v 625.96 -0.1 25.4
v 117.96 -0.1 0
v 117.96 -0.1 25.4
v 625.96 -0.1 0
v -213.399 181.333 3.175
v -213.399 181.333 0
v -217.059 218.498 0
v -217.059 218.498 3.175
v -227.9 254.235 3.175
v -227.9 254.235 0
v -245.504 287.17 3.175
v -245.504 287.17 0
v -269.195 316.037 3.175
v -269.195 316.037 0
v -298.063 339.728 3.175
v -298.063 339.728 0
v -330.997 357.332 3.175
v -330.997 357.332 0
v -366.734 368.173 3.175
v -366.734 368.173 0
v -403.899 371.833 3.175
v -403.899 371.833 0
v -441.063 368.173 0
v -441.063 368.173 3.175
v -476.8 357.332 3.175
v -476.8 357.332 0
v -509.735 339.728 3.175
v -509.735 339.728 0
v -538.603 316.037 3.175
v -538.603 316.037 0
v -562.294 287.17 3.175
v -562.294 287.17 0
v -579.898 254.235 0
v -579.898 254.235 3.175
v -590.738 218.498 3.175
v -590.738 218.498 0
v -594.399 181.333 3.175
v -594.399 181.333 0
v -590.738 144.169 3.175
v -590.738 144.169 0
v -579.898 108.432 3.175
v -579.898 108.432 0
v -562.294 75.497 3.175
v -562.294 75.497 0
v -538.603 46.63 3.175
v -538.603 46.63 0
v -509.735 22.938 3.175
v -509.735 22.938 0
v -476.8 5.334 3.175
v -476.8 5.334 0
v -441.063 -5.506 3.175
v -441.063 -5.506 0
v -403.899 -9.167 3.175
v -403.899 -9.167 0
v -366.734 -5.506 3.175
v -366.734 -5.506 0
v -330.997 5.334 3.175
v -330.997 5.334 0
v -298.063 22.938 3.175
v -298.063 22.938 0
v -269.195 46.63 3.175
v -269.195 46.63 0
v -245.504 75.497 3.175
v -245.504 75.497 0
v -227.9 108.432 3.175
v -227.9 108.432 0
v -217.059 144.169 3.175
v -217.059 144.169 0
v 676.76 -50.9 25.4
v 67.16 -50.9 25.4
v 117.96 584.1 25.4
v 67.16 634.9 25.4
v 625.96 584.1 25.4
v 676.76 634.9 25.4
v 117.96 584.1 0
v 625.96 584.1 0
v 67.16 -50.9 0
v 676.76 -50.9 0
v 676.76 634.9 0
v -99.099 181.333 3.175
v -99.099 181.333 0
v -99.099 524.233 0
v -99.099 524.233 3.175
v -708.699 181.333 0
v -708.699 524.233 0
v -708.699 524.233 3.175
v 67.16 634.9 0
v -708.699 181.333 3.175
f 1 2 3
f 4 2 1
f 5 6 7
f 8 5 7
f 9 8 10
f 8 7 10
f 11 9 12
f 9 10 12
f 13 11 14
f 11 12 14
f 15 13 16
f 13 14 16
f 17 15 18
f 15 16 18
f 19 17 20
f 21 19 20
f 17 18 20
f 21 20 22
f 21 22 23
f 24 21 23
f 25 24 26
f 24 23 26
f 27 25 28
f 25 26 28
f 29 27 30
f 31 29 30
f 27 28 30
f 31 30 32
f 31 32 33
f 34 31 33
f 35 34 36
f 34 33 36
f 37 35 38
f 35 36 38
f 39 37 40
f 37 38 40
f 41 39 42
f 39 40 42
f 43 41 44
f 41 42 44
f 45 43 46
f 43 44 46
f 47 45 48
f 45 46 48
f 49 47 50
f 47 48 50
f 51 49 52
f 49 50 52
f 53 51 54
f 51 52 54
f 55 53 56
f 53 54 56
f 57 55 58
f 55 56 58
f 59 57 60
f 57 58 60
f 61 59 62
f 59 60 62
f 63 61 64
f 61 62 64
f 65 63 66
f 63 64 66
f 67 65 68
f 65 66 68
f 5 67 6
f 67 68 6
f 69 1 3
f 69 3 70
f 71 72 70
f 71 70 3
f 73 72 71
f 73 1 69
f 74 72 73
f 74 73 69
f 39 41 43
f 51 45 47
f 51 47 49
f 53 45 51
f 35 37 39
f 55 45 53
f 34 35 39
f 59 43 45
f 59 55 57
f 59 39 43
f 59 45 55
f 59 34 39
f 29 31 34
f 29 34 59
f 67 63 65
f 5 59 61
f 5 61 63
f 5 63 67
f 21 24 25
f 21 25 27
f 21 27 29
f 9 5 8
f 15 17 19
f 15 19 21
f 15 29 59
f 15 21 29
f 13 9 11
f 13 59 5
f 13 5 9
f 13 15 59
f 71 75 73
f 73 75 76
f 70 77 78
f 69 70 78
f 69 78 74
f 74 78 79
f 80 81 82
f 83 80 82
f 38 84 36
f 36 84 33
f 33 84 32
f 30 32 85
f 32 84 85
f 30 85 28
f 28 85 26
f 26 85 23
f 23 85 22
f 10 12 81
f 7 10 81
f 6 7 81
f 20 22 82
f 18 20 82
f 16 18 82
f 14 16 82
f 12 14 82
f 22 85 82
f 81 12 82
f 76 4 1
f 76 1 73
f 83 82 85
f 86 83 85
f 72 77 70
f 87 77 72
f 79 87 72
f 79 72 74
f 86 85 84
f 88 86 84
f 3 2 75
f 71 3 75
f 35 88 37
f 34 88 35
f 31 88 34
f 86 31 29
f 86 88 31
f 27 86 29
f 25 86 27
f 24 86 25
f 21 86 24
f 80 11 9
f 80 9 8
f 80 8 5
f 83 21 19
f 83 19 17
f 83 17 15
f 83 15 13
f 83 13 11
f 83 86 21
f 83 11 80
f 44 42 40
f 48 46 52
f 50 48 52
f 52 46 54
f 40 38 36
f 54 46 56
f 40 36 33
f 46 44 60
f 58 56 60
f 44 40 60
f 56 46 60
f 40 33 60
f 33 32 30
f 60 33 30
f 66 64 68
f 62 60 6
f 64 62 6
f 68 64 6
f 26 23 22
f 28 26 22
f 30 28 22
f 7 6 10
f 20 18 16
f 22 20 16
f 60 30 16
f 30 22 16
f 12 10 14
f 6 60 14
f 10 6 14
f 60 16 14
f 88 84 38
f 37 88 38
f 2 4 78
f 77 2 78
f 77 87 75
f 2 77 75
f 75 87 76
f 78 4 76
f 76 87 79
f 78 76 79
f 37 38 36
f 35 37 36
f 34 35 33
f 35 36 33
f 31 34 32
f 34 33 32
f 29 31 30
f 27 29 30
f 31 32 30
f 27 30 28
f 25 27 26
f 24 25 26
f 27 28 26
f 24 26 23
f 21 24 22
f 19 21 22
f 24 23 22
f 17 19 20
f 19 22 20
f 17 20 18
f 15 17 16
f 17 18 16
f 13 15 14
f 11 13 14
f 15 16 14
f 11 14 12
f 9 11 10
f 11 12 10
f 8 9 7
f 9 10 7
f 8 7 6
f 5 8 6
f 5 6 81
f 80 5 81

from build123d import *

# Parameters (mm, degrees)
F1_DEPTH = 3.175
F2_DEPTH = 3.175
F3_W     = 609.6
F3_H     = 685.8
F3_W_2   = 508
F3_H_2   = 584.2
F4_DEPTH = 25.4


# Not quite as in the source:
# - a length typed as a fraction of an inch, garbled in the dataset ("3 / 203.2 mm" for 3/8 in), is restored


with BuildPart() as f1:
    # F0 (on Top) → F1 (new body)
    with BuildSketch(Plane.XY):
        with BuildLine():
            ThreePointArc((-594.3986861706, 181.333437562), (-403.8986861706, -9.166562438), (-213.3986861706, 181.333437562))
            ThreePointArc((-213.3986861706, 181.333437562), (-403.8986861706, 371.833437562), (-594.3986861706, 181.333437562))
        make_face()
    extrude(amount=F1_DEPTH)


with BuildPart() as f2:
    # F0 (on Top) → F2 (new body)
    with BuildSketch(Plane.XY):
        with BuildLine():
            Line((-213.3986861706, 181.333437562), (-99.0986861706, 181.333437562))
            Line((-99.0986861706, 181.333437562), (-99.0986861706, 524.233437562))
            Line((-99.0986861706, 524.233437562), (-708.6986861706, 524.233437562))
            Line((-708.6986861706, 524.233437562), (-708.6986861706, 181.333437562))
            Line((-708.6986861706, 181.333437562), (-594.3986861706, 181.333437562))
            ThreePointArc((-594.3986861706, 181.333437562), (-403.8986861706, 371.833437562), (-213.3986861706, 181.333437562))
        make_face()
    extrude(amount=F2_DEPTH)


with BuildPart() as f4:
    # F3 (on Top) → F4 (new body)
    with BuildSketch(Plane.XY):
        with Locations((371.9603717327, 291.9999957085)):
            Rectangle(F3_W, F3_H)
        with Locations((371.9603717327, 291.9999957085)):
            Rectangle(F3_W_2, F3_H_2, mode=Mode.SUBTRACT)
    extrude(amount=F4_DEPTH)


solid = Compound([f1.part, f2.part, f4.part])
